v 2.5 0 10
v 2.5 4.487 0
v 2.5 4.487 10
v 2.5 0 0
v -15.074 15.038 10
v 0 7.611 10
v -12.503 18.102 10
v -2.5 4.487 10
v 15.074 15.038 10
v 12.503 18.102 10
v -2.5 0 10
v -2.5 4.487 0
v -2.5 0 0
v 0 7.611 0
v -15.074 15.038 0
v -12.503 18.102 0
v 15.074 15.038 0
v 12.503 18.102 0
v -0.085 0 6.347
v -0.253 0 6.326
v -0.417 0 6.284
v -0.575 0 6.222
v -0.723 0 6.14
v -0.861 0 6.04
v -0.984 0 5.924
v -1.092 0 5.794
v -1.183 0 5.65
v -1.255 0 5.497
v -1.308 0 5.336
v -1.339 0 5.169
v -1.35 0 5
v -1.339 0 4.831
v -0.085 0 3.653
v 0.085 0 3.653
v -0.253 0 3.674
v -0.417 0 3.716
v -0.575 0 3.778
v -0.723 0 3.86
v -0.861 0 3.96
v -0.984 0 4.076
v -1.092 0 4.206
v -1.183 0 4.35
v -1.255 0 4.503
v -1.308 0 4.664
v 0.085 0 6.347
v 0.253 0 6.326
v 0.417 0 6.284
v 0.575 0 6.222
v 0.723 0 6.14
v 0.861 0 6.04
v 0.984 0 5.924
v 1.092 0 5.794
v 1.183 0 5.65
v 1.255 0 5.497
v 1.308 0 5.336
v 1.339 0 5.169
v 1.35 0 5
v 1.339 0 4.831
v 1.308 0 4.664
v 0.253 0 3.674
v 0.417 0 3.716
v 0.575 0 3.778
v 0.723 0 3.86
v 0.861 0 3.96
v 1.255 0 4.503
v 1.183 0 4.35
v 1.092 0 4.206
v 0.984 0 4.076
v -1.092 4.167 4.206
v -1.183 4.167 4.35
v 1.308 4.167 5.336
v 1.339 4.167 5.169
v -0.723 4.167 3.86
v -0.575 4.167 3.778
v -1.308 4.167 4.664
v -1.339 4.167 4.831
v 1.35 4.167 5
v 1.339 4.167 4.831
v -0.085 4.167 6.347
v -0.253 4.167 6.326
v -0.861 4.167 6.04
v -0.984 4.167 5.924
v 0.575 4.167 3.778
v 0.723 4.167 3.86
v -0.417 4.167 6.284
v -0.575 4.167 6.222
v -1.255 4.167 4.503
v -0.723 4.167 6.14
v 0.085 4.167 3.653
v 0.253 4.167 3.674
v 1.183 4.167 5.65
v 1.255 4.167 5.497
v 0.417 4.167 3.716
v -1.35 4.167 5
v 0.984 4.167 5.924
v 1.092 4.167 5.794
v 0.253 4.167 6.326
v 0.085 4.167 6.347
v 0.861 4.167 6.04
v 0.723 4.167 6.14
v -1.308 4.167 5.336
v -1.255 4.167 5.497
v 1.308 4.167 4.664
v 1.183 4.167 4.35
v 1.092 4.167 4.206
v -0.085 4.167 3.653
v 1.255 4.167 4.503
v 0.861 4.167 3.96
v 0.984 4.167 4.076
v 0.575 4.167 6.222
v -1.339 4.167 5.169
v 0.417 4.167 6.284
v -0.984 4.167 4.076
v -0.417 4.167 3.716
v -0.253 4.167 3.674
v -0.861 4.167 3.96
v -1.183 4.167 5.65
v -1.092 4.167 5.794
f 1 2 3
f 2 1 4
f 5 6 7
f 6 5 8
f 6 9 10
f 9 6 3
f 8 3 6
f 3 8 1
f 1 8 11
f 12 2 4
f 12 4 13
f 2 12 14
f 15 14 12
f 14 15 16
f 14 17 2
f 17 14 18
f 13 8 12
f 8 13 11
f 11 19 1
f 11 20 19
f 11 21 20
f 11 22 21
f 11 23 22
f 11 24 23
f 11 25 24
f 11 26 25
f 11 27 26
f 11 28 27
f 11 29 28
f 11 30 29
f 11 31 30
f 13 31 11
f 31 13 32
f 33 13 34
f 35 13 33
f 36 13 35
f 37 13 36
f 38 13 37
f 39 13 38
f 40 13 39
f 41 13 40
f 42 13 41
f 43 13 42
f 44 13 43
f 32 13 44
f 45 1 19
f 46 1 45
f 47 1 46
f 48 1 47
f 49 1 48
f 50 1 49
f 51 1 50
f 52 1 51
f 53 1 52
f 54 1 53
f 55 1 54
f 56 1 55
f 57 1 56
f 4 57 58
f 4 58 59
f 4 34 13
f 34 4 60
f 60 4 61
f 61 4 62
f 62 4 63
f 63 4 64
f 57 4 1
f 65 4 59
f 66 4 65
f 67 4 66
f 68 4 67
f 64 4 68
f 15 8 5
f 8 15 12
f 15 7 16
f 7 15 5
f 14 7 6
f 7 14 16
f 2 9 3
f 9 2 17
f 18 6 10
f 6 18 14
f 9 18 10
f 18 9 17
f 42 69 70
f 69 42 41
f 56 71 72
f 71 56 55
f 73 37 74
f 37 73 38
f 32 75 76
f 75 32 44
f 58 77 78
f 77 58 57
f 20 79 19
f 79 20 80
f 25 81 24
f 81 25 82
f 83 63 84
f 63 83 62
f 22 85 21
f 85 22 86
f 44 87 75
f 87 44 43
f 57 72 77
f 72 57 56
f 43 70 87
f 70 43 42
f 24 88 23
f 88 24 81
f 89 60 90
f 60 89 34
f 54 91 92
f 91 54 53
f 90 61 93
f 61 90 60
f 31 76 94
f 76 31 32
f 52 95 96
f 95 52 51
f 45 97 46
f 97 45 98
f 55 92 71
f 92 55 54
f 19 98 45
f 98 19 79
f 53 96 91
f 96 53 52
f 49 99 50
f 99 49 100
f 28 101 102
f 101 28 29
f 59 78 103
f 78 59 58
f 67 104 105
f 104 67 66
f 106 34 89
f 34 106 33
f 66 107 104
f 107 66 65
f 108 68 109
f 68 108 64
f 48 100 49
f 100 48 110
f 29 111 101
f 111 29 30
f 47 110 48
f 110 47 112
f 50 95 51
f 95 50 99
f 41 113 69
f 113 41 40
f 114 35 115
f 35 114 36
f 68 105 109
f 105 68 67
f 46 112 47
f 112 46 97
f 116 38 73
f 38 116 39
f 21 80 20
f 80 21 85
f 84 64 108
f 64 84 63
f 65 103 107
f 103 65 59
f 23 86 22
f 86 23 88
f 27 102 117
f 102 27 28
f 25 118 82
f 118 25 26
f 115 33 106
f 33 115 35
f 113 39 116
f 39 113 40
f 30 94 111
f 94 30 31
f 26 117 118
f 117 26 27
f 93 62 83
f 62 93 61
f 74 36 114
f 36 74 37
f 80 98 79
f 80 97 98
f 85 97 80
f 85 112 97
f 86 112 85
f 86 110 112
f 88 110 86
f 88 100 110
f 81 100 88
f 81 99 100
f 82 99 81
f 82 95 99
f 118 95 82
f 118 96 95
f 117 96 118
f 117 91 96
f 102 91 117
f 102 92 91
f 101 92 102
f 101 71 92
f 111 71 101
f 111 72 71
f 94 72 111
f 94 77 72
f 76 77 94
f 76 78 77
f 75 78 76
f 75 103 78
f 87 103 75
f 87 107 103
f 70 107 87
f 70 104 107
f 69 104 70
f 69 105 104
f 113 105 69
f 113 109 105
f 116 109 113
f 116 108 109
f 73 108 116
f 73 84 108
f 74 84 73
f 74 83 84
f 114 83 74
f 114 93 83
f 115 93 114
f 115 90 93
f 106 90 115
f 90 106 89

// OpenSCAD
// ==== Thông số ====
thickness = 10;   // độ dày theo trục Z
stem_height = 5; // chiều cao thân dọc
stem_width = 5;   // độ rộng thân dọc
arm_length = 18;  // độ dài mỗi nhánh
arm_width = 4;    // độ rộng nhánh
angle_out = 50;   // góc xoay hai nhánh ra ngoài (độ)
hole_d = 2.7;     // đường kính lỗ
hole_depth = 5;   // độ sâu lỗ

difference() {
    union() {
        // Thân dọc (giữa chữ Y)
        translate([-stem_width/2, 0, 0])
            cube([stem_width, stem_height, thickness]);

        // Nhánh trái
        translate([0, stem_height, 0])
            rotate([0, 0, angle_out])
                translate([-arm_width/2, 0, 0])
                    cube([arm_width, arm_length, thickness]);

        // Nhánh phải
        translate([0, stem_height, 0])
            rotate([0, 0, -angle_out])
                translate([-arm_width/2, 0, 0])
                    cube([arm_width, arm_length, thickness]);
    }

    // Lỗ ở giữa để gắn ốc
    translate([0, stem_height/3, thickness/2])
        rotate([90, 0, 0])
            cylinder(h = hole_depth, d = hole_d, center = true, $fn = 50);
}
